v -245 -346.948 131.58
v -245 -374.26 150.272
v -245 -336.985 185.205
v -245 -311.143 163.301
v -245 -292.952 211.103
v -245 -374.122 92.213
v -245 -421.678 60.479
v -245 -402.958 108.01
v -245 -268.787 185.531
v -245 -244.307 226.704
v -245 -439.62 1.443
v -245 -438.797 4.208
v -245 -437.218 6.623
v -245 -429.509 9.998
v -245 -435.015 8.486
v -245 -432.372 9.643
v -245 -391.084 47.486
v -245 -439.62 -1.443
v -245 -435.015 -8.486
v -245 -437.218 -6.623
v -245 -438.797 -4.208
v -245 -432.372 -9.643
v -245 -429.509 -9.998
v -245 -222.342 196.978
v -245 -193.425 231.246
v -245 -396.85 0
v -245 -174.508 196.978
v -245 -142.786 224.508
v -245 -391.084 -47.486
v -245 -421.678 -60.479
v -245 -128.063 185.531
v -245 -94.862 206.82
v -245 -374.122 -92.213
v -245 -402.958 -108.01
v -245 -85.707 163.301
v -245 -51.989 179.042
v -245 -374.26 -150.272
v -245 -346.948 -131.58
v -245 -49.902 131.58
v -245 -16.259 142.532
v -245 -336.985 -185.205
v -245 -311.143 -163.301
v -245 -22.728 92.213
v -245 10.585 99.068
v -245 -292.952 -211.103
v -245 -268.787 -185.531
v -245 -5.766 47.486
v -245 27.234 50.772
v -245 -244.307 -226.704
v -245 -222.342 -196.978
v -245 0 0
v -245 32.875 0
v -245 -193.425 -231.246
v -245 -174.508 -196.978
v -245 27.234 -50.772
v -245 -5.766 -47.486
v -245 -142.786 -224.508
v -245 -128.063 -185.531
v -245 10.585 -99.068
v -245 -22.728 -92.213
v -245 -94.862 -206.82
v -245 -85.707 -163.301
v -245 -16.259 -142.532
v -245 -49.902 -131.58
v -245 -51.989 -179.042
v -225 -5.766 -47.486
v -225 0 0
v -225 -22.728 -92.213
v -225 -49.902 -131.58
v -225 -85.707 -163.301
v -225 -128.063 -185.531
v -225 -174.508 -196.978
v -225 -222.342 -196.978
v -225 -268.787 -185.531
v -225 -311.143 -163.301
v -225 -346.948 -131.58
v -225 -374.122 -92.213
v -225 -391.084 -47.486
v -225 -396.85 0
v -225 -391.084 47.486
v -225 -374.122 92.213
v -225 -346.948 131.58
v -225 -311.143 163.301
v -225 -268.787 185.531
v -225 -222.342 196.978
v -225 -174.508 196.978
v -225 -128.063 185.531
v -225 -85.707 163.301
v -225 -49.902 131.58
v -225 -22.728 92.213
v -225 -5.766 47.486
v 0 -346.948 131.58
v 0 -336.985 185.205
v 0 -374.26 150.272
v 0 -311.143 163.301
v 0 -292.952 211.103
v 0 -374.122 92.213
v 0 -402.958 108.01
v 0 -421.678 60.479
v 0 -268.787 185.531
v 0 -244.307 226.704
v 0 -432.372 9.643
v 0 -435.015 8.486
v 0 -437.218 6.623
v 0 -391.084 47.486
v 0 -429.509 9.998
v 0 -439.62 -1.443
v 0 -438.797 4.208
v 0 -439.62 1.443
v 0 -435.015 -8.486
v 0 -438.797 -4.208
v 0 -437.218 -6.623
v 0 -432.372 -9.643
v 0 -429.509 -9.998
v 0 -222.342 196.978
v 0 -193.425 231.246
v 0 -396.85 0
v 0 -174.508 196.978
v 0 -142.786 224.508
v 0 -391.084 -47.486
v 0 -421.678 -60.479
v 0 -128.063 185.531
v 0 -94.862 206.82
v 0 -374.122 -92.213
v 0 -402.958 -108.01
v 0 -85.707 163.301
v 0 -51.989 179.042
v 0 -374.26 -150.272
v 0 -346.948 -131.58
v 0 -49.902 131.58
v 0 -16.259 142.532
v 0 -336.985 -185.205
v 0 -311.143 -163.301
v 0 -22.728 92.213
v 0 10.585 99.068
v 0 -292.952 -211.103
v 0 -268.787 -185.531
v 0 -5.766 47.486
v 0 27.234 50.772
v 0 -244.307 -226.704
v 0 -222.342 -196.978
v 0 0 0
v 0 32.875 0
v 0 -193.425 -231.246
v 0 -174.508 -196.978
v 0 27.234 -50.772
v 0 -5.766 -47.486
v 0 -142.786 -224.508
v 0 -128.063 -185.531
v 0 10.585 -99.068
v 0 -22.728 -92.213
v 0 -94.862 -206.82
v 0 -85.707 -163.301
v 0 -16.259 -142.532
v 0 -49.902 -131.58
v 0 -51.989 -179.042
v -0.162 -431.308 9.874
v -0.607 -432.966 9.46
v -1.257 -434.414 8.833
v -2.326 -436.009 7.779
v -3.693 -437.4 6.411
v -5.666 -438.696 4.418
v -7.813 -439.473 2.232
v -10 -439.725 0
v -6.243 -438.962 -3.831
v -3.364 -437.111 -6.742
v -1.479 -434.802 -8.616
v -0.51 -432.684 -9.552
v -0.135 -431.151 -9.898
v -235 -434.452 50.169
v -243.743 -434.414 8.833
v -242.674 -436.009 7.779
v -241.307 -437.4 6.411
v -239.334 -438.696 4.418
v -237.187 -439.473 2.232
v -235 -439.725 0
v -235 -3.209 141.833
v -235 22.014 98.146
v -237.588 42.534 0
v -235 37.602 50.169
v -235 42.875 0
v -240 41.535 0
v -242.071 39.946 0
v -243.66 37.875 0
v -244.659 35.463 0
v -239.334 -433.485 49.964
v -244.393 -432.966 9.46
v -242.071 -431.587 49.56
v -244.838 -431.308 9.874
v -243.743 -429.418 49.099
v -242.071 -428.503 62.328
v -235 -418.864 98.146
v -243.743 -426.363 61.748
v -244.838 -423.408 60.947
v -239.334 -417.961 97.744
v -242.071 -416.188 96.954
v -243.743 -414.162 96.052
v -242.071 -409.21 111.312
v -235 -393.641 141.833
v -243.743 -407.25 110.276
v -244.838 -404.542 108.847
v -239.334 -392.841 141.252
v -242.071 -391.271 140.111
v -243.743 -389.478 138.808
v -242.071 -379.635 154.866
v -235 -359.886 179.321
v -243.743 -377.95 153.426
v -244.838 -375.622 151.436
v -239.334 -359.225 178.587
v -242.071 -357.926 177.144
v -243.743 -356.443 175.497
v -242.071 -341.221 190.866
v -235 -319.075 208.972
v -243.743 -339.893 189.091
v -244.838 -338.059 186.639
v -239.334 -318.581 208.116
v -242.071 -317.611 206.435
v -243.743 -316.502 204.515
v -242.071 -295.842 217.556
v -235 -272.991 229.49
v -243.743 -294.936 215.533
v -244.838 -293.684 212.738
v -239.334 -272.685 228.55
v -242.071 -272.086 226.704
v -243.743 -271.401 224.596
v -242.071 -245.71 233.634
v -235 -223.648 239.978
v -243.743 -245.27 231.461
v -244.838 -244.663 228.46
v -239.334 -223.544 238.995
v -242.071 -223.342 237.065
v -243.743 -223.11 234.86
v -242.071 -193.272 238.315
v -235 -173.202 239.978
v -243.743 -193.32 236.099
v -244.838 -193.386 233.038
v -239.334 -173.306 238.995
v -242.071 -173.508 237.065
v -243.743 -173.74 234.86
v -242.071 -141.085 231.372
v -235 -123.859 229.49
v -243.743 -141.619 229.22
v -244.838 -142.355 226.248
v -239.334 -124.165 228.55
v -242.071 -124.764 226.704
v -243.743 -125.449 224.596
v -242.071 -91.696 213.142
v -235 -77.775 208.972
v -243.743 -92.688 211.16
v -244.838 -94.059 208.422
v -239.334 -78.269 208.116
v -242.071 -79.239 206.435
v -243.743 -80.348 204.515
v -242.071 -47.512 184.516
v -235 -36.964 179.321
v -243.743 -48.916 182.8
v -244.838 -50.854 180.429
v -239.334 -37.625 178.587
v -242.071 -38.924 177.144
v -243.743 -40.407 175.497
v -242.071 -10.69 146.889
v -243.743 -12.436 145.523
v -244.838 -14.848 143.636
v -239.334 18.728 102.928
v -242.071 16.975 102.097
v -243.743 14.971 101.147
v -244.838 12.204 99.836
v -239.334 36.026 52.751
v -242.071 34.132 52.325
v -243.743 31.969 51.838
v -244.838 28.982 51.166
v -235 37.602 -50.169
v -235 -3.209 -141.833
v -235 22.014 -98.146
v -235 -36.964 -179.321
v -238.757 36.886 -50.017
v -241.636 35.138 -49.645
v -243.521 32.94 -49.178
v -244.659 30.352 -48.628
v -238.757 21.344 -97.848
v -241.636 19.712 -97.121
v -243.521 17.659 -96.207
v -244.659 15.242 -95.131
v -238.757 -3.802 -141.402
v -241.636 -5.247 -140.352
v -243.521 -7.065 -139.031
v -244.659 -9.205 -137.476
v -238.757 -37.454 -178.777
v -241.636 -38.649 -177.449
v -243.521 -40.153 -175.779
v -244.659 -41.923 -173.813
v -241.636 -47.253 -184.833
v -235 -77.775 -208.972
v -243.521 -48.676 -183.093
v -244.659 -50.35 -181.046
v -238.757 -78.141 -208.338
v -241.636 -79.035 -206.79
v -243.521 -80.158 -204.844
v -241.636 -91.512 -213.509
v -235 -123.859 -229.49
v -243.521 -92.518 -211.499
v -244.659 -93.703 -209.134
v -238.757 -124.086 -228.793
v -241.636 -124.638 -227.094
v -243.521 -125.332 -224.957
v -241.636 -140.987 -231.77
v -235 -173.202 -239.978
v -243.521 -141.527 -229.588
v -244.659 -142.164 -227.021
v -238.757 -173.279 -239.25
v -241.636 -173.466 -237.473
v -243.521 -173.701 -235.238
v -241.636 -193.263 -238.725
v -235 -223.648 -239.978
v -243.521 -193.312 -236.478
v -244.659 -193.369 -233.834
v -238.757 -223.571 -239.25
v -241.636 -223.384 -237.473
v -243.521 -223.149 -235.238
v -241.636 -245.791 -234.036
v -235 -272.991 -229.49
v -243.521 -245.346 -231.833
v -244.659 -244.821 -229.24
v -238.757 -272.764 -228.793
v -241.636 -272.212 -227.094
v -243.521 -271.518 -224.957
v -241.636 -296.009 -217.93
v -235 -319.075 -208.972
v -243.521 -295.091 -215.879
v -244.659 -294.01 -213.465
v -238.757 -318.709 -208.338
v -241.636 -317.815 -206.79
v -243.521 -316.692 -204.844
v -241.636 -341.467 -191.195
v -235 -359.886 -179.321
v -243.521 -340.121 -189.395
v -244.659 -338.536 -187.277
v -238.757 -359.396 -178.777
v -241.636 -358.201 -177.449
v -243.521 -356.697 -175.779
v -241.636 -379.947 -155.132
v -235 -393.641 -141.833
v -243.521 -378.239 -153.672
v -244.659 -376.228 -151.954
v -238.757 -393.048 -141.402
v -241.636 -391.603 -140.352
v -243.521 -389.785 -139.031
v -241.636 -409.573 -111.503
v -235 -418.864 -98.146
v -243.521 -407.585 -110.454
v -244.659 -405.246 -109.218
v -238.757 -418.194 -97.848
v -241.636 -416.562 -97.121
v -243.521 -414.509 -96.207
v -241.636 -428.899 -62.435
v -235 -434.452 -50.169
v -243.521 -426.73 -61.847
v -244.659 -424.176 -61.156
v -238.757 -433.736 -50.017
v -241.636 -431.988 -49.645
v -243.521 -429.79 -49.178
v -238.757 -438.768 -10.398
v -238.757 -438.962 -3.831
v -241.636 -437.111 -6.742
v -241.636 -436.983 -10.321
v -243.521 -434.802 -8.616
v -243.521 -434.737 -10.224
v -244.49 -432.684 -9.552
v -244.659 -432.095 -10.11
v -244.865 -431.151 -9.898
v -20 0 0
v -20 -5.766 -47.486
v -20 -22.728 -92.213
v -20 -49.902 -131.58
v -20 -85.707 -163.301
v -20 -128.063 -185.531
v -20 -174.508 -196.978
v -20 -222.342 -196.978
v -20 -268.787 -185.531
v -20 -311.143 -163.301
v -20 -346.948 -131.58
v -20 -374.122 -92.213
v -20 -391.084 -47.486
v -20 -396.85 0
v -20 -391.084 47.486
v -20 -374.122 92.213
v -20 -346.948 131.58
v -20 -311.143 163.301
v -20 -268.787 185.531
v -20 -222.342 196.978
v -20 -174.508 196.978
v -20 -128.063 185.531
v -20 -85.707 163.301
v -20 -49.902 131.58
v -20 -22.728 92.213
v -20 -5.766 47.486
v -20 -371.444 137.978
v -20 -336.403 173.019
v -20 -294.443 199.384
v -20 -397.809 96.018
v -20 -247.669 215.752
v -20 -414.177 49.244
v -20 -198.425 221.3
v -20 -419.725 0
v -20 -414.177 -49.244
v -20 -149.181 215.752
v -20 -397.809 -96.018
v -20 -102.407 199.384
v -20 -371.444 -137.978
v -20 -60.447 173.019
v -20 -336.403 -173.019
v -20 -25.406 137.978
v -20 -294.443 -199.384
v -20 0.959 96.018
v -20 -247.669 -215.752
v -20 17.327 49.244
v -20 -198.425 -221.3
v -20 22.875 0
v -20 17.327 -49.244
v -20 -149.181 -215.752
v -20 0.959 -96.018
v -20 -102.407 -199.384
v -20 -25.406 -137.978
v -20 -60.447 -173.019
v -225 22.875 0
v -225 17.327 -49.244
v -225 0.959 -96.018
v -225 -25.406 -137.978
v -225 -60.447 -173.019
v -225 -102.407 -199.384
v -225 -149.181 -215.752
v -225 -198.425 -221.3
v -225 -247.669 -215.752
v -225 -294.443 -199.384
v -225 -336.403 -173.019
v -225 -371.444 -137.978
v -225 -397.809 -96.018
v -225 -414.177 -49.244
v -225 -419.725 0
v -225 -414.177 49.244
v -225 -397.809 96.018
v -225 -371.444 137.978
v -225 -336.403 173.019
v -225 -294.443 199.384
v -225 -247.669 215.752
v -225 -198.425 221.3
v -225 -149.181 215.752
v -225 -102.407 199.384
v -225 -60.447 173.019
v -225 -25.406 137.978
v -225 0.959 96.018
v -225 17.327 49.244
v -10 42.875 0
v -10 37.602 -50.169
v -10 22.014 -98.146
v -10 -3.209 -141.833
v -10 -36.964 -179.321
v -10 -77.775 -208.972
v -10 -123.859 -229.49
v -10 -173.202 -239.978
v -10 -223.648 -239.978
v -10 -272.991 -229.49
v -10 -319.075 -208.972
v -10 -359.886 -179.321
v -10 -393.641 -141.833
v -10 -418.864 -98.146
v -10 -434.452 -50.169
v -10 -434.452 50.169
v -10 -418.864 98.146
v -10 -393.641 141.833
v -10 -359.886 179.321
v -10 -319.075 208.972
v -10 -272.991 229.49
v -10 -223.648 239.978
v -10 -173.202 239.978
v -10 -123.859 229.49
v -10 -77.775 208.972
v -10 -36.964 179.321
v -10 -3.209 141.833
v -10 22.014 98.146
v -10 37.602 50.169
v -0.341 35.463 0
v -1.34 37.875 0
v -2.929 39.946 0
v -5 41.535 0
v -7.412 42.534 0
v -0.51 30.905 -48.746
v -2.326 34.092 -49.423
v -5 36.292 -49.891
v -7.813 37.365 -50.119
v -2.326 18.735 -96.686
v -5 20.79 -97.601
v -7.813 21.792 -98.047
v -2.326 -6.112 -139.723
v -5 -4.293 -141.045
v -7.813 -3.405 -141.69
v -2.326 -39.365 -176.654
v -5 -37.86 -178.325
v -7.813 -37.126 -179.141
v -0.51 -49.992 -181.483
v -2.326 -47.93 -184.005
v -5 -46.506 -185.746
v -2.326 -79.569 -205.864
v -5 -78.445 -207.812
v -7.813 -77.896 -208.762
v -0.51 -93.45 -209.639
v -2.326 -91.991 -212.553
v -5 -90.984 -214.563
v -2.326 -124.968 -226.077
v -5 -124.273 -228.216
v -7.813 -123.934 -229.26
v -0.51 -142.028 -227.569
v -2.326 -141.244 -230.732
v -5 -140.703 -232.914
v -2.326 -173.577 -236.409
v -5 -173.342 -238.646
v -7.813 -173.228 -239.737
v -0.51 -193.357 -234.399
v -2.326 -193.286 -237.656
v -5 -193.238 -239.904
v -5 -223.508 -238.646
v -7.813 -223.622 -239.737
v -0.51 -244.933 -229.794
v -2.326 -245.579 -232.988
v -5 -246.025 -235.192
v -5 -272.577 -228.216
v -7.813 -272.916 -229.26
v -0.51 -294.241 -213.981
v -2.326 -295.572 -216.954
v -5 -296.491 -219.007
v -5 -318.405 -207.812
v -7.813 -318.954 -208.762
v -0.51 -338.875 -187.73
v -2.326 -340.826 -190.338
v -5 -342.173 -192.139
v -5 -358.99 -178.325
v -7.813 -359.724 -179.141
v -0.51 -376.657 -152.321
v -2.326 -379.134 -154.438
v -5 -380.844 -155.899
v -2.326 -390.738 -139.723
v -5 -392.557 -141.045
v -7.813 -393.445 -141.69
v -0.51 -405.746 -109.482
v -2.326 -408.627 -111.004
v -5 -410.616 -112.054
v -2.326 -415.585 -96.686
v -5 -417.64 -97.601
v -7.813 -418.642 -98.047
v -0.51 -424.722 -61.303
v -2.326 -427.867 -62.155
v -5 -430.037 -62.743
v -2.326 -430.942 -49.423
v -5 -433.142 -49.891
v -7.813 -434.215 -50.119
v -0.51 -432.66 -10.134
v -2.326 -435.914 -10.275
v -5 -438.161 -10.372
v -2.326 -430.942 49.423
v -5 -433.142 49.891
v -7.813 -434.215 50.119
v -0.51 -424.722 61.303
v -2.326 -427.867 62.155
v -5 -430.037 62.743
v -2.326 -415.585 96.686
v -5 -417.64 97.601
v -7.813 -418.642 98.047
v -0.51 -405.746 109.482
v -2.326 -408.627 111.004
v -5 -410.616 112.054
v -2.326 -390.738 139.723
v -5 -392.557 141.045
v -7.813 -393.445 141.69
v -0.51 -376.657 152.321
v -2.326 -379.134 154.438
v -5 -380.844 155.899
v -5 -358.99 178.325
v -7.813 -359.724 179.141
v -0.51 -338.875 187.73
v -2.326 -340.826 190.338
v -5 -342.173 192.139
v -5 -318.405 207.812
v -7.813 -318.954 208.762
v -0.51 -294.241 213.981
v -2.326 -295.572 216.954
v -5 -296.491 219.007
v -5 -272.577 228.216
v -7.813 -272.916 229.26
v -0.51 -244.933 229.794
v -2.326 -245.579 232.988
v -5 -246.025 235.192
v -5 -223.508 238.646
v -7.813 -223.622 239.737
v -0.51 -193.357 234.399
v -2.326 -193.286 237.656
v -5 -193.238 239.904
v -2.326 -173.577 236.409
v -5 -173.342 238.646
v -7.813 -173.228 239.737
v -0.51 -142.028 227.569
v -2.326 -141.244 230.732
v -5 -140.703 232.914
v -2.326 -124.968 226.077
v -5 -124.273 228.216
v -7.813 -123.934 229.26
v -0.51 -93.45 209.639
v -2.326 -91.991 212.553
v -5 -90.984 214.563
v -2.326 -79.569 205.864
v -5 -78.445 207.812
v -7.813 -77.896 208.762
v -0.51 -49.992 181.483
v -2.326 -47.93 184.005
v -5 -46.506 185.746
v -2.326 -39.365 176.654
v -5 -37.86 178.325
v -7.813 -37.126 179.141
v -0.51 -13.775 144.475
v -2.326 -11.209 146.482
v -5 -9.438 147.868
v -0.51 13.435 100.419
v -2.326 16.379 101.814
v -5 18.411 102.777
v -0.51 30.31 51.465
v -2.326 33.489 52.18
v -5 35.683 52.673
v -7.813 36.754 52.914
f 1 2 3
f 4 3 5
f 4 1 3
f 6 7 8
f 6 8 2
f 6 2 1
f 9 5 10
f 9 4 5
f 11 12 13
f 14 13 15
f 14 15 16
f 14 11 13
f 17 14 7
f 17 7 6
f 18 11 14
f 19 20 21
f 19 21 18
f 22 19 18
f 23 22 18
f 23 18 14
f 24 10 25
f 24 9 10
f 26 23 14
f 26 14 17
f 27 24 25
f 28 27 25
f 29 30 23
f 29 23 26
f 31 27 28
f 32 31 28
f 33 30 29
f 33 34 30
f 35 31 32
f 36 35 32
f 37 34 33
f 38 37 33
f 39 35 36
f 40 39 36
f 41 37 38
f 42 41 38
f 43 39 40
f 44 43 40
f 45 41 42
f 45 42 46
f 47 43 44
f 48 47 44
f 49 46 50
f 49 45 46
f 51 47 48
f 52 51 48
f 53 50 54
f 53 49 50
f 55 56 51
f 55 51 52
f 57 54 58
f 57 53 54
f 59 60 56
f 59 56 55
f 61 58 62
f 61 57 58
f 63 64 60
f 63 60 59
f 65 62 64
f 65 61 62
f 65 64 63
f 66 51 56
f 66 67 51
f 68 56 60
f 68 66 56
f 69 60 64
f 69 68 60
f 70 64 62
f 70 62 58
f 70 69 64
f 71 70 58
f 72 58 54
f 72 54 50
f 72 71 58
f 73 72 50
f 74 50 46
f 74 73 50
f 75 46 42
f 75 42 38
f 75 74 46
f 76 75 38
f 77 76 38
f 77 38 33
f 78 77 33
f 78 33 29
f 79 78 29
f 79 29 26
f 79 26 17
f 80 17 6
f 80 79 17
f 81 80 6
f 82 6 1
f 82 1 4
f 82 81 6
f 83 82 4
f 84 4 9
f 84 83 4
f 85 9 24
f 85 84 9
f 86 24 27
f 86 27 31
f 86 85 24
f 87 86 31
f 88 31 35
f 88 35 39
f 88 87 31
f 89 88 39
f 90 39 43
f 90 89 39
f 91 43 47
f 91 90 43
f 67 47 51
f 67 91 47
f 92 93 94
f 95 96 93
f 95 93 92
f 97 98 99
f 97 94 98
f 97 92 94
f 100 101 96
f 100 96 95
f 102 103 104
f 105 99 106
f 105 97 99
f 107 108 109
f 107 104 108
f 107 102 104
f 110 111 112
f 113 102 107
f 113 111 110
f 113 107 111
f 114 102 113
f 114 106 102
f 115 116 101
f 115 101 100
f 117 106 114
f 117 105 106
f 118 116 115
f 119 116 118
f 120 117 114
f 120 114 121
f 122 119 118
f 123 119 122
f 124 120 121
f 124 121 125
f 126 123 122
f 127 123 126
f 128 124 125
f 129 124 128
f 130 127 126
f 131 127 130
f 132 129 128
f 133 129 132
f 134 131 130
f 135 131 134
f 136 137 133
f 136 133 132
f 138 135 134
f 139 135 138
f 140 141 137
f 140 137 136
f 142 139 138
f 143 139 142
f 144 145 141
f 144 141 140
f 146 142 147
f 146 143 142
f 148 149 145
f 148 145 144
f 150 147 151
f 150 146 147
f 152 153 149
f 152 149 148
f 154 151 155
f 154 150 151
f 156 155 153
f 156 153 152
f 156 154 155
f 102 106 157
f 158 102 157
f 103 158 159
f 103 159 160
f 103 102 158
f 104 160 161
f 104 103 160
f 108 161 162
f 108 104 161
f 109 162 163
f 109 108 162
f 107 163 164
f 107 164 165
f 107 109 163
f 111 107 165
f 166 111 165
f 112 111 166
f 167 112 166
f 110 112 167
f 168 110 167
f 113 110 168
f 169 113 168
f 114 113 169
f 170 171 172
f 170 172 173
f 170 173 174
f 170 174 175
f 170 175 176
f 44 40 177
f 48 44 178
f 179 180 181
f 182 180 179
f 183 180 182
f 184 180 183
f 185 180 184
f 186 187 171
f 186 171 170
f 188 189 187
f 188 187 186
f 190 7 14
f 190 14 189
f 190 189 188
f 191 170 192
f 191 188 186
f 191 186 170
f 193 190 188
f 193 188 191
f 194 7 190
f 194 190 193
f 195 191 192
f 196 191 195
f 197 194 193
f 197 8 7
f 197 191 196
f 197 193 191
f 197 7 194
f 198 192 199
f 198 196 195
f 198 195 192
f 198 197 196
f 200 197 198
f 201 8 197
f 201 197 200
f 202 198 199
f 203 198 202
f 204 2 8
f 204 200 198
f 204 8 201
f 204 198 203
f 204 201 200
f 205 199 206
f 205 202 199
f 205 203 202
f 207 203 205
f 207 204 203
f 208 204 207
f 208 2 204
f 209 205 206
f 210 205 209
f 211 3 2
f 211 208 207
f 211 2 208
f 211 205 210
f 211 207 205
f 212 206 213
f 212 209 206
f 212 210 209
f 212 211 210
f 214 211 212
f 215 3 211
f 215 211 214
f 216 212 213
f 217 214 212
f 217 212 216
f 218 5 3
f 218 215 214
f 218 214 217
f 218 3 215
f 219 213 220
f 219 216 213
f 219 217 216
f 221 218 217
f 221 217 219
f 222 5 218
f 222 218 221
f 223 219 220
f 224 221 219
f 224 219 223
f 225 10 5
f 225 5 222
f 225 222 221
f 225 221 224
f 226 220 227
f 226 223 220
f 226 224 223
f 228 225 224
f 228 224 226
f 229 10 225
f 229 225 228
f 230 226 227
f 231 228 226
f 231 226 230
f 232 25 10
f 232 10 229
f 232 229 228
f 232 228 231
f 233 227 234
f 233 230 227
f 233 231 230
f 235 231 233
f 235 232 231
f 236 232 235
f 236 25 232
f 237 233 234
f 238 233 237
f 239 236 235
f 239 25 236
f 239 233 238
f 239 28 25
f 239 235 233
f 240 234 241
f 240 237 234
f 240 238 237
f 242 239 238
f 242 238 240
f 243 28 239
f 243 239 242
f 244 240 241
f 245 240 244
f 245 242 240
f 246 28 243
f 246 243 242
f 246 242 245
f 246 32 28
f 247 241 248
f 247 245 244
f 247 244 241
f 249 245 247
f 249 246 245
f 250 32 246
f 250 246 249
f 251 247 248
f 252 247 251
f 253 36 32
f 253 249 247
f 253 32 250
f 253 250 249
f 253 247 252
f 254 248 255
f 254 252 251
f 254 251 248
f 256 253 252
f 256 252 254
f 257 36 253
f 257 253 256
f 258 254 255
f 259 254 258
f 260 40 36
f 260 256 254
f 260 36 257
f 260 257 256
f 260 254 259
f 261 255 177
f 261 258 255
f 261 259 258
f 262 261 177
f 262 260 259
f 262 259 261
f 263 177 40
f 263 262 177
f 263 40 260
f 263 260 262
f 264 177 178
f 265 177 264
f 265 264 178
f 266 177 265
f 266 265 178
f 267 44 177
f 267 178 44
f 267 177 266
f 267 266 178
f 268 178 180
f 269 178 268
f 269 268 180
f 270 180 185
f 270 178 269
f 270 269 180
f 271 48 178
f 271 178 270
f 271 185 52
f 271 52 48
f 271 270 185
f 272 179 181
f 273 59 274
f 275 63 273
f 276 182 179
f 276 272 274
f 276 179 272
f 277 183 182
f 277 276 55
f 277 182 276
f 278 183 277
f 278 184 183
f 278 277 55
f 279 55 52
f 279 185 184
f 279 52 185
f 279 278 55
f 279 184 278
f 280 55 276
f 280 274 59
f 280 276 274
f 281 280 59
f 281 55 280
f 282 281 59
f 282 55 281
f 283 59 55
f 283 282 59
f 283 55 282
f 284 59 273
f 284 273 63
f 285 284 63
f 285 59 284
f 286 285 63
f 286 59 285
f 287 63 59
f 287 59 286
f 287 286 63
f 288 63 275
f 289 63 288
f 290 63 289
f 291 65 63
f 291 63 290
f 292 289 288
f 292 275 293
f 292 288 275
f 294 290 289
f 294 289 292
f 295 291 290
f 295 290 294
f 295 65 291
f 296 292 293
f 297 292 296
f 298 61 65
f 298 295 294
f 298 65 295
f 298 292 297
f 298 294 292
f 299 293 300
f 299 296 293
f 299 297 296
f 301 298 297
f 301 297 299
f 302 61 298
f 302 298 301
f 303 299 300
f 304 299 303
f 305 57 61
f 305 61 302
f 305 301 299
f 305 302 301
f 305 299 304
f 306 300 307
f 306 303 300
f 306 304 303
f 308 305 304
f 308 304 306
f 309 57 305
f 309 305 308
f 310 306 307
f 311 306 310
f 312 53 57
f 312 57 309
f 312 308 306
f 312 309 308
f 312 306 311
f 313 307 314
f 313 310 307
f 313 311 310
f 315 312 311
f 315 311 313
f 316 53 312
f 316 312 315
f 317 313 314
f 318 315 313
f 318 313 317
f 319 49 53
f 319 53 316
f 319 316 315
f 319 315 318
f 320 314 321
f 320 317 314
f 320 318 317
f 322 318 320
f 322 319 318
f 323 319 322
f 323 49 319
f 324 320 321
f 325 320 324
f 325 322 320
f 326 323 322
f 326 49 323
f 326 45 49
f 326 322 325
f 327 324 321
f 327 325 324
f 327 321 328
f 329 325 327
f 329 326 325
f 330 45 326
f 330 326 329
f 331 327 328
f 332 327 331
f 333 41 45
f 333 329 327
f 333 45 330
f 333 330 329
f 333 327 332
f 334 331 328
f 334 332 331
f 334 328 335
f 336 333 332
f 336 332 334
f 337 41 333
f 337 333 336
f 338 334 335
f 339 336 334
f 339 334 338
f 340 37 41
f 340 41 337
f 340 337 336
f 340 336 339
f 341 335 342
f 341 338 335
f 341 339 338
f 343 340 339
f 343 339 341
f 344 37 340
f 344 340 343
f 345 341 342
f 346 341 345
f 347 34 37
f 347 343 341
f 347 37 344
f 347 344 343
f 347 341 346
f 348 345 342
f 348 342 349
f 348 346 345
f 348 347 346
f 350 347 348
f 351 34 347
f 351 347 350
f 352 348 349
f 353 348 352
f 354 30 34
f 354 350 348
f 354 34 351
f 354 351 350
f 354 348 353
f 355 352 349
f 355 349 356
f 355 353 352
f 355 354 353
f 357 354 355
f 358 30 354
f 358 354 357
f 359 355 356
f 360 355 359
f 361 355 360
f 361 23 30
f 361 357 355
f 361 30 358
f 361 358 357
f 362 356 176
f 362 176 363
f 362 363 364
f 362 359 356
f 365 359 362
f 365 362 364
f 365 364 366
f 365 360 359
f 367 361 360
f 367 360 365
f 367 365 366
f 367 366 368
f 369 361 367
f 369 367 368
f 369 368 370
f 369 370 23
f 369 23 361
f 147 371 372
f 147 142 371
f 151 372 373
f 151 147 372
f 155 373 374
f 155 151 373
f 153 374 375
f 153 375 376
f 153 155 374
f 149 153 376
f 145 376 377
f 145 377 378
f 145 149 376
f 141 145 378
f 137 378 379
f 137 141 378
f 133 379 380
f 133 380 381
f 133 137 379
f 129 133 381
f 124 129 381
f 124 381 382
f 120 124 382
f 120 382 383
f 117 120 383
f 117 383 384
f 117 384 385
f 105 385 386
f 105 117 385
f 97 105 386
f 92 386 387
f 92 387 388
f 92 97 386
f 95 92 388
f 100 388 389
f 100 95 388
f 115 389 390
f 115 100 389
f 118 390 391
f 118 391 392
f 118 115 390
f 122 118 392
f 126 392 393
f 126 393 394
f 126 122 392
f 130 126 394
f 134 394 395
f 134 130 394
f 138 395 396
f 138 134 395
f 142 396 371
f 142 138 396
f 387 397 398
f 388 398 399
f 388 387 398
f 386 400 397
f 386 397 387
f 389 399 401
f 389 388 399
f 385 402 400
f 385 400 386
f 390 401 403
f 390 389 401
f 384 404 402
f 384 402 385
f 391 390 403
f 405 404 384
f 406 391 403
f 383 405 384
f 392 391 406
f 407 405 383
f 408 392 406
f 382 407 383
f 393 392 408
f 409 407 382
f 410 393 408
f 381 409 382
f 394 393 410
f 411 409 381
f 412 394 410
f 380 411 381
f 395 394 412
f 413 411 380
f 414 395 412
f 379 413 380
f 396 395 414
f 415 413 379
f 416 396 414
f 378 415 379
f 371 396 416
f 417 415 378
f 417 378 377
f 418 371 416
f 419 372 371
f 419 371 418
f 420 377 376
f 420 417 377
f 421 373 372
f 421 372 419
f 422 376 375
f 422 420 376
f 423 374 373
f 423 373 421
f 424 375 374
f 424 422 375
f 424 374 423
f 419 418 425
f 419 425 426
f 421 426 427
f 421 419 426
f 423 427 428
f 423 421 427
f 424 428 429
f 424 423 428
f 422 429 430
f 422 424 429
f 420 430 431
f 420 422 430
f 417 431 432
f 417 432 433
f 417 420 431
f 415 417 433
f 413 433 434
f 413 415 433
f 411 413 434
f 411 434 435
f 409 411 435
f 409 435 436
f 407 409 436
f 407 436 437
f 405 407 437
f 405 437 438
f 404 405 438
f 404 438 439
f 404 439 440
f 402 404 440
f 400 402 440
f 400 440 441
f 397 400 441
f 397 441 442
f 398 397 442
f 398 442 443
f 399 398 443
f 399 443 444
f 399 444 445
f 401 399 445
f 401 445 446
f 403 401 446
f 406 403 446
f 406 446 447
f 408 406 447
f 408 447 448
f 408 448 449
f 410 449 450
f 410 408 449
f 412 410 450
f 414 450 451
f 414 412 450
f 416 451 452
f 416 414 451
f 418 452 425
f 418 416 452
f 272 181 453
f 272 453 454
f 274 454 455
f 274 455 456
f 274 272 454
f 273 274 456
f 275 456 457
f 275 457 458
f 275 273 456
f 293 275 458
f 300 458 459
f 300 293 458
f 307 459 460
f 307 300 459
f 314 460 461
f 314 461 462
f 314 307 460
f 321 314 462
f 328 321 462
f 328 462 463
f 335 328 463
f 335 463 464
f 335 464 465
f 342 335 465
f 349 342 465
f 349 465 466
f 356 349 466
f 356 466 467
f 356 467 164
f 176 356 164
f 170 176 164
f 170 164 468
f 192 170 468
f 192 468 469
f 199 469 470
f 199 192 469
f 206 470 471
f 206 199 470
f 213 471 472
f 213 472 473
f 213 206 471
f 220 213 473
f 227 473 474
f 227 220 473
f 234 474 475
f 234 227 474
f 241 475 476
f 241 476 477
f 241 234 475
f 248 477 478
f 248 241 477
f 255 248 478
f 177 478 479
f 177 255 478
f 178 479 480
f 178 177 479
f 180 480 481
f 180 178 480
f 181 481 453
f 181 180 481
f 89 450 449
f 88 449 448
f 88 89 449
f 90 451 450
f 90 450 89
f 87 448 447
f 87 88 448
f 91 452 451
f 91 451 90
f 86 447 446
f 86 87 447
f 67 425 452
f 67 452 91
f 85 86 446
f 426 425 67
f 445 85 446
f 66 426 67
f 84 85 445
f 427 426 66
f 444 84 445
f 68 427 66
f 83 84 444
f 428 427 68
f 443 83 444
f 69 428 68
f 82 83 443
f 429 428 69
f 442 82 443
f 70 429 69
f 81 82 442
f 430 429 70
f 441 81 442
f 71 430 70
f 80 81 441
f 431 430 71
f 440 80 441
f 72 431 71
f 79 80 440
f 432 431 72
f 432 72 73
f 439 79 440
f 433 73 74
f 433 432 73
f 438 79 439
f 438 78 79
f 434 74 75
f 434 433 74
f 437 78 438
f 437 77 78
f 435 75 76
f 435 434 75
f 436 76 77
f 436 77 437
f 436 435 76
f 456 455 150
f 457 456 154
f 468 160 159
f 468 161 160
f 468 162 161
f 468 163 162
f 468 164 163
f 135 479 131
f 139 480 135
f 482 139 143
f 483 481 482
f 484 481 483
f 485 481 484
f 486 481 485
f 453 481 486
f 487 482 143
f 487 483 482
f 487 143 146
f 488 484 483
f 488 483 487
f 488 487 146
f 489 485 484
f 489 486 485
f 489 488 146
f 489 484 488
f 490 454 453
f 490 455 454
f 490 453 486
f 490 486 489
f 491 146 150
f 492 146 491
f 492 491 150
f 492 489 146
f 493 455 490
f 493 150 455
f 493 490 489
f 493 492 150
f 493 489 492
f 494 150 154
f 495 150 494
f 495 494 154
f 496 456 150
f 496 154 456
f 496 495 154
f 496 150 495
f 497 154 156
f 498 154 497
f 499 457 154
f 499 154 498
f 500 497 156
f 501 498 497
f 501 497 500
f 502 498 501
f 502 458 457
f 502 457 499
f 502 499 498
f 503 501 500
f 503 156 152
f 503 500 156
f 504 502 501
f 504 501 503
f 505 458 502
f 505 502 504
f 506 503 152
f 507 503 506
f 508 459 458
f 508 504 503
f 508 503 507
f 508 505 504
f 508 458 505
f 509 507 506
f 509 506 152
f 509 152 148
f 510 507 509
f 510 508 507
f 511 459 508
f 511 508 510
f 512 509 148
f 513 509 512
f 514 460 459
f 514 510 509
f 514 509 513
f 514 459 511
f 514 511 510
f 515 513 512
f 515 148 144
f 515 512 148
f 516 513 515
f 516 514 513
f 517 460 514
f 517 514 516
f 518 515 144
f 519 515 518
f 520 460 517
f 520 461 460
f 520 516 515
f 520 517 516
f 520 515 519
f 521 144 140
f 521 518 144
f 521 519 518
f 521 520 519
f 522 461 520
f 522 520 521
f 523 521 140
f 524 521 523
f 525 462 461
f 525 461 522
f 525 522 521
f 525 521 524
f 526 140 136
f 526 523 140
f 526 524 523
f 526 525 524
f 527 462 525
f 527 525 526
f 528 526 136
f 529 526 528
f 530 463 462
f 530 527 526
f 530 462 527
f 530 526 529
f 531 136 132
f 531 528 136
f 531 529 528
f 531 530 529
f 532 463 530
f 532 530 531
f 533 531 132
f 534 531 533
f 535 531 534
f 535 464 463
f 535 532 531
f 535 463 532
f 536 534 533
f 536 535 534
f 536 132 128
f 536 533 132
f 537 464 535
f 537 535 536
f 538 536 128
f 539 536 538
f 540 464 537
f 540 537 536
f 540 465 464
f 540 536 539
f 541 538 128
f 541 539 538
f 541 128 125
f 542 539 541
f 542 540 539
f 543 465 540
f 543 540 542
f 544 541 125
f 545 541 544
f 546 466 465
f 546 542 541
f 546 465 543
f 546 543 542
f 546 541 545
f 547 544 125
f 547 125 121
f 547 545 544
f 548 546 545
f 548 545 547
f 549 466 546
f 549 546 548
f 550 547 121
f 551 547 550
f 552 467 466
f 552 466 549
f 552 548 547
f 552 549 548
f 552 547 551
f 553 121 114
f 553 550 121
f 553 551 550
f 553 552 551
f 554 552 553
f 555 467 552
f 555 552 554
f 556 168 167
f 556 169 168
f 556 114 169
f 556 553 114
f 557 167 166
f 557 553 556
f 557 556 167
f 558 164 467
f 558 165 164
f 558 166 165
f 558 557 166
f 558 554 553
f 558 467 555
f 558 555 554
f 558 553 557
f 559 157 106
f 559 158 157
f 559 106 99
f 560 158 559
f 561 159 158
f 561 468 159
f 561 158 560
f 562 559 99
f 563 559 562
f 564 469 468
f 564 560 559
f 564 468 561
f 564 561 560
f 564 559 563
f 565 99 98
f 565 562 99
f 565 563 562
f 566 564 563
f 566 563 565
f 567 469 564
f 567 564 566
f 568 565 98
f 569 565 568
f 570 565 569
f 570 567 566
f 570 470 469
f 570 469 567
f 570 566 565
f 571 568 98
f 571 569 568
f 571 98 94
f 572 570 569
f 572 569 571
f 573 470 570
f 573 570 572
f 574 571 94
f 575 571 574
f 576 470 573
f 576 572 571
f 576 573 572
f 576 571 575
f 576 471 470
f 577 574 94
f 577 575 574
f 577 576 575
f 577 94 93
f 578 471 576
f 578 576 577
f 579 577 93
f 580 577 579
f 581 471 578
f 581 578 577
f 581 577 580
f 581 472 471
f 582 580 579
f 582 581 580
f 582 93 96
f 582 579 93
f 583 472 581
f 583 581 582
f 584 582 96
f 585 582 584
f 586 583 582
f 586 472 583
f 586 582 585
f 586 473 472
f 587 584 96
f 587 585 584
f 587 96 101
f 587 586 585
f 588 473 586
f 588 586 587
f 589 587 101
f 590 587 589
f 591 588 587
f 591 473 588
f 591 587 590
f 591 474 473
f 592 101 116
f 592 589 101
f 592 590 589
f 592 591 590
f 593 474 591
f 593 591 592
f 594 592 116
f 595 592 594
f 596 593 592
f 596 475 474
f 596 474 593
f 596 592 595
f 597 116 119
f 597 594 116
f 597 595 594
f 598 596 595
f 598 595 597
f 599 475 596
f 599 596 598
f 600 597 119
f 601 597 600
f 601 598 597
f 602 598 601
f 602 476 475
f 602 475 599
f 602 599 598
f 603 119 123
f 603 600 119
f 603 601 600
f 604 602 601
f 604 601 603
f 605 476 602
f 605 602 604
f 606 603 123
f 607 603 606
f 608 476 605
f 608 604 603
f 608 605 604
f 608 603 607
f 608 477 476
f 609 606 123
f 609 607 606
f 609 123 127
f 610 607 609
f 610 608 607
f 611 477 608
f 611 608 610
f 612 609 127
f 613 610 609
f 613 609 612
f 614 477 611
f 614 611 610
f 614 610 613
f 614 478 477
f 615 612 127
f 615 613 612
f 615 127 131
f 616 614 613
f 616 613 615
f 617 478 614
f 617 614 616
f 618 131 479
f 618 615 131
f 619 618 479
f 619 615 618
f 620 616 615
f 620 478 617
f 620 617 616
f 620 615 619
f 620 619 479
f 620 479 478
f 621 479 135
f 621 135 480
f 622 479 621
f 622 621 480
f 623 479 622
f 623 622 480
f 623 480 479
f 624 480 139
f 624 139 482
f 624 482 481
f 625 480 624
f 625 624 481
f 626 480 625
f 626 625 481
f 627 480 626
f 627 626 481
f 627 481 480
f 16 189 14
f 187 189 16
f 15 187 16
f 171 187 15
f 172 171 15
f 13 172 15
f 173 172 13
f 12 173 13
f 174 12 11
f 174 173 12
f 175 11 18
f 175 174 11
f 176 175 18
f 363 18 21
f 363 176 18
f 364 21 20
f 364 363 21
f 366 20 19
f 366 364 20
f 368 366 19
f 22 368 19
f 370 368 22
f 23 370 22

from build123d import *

# Parameters (mm, degrees)
RACCORDO1_R                  = 10
SCHIZZO2_R                   = 10
ESTRUSIONE_ESTRUSIONE1_DEPTH = 245


with BuildPart() as part:
    # Schizzo1 → Rivoluzione1 (revolve)
    with BuildSketch(Plane.XY):
        Polygon((0, 0), (0, 42.875), (-245, 42.875), (-245, 0), (-225, 0), (-225, 22.875), (-20, 22.875), (-20, 0), align=None)
    revolve(axis=Axis((-137.660777117, -198.425, 0), (-1, 0, 0)))

    # Raccordo1
    raccordo1_edges = [part.edges().sort_by_distance(p)[0] for p in [
        (-245, -439.725, 0),
        (0, -439.725, 0),
    ]]
    fillet(raccordo1_edges, radius=RACCORDO1_R)

    # Schizzo2 → Estrusione-Estrusione1 (add)
    with BuildSketch(Plane(origin=(0, 0, 0), x_dir=(0, 0, -1), z_dir=(1, 0, 0))):
        with Locations((0, -429.725)):
            Circle(SCHIZZO2_R)
    extrude(amount=-ESTRUSIONE_ESTRUSIONE1_DEPTH)


solid = part.part
